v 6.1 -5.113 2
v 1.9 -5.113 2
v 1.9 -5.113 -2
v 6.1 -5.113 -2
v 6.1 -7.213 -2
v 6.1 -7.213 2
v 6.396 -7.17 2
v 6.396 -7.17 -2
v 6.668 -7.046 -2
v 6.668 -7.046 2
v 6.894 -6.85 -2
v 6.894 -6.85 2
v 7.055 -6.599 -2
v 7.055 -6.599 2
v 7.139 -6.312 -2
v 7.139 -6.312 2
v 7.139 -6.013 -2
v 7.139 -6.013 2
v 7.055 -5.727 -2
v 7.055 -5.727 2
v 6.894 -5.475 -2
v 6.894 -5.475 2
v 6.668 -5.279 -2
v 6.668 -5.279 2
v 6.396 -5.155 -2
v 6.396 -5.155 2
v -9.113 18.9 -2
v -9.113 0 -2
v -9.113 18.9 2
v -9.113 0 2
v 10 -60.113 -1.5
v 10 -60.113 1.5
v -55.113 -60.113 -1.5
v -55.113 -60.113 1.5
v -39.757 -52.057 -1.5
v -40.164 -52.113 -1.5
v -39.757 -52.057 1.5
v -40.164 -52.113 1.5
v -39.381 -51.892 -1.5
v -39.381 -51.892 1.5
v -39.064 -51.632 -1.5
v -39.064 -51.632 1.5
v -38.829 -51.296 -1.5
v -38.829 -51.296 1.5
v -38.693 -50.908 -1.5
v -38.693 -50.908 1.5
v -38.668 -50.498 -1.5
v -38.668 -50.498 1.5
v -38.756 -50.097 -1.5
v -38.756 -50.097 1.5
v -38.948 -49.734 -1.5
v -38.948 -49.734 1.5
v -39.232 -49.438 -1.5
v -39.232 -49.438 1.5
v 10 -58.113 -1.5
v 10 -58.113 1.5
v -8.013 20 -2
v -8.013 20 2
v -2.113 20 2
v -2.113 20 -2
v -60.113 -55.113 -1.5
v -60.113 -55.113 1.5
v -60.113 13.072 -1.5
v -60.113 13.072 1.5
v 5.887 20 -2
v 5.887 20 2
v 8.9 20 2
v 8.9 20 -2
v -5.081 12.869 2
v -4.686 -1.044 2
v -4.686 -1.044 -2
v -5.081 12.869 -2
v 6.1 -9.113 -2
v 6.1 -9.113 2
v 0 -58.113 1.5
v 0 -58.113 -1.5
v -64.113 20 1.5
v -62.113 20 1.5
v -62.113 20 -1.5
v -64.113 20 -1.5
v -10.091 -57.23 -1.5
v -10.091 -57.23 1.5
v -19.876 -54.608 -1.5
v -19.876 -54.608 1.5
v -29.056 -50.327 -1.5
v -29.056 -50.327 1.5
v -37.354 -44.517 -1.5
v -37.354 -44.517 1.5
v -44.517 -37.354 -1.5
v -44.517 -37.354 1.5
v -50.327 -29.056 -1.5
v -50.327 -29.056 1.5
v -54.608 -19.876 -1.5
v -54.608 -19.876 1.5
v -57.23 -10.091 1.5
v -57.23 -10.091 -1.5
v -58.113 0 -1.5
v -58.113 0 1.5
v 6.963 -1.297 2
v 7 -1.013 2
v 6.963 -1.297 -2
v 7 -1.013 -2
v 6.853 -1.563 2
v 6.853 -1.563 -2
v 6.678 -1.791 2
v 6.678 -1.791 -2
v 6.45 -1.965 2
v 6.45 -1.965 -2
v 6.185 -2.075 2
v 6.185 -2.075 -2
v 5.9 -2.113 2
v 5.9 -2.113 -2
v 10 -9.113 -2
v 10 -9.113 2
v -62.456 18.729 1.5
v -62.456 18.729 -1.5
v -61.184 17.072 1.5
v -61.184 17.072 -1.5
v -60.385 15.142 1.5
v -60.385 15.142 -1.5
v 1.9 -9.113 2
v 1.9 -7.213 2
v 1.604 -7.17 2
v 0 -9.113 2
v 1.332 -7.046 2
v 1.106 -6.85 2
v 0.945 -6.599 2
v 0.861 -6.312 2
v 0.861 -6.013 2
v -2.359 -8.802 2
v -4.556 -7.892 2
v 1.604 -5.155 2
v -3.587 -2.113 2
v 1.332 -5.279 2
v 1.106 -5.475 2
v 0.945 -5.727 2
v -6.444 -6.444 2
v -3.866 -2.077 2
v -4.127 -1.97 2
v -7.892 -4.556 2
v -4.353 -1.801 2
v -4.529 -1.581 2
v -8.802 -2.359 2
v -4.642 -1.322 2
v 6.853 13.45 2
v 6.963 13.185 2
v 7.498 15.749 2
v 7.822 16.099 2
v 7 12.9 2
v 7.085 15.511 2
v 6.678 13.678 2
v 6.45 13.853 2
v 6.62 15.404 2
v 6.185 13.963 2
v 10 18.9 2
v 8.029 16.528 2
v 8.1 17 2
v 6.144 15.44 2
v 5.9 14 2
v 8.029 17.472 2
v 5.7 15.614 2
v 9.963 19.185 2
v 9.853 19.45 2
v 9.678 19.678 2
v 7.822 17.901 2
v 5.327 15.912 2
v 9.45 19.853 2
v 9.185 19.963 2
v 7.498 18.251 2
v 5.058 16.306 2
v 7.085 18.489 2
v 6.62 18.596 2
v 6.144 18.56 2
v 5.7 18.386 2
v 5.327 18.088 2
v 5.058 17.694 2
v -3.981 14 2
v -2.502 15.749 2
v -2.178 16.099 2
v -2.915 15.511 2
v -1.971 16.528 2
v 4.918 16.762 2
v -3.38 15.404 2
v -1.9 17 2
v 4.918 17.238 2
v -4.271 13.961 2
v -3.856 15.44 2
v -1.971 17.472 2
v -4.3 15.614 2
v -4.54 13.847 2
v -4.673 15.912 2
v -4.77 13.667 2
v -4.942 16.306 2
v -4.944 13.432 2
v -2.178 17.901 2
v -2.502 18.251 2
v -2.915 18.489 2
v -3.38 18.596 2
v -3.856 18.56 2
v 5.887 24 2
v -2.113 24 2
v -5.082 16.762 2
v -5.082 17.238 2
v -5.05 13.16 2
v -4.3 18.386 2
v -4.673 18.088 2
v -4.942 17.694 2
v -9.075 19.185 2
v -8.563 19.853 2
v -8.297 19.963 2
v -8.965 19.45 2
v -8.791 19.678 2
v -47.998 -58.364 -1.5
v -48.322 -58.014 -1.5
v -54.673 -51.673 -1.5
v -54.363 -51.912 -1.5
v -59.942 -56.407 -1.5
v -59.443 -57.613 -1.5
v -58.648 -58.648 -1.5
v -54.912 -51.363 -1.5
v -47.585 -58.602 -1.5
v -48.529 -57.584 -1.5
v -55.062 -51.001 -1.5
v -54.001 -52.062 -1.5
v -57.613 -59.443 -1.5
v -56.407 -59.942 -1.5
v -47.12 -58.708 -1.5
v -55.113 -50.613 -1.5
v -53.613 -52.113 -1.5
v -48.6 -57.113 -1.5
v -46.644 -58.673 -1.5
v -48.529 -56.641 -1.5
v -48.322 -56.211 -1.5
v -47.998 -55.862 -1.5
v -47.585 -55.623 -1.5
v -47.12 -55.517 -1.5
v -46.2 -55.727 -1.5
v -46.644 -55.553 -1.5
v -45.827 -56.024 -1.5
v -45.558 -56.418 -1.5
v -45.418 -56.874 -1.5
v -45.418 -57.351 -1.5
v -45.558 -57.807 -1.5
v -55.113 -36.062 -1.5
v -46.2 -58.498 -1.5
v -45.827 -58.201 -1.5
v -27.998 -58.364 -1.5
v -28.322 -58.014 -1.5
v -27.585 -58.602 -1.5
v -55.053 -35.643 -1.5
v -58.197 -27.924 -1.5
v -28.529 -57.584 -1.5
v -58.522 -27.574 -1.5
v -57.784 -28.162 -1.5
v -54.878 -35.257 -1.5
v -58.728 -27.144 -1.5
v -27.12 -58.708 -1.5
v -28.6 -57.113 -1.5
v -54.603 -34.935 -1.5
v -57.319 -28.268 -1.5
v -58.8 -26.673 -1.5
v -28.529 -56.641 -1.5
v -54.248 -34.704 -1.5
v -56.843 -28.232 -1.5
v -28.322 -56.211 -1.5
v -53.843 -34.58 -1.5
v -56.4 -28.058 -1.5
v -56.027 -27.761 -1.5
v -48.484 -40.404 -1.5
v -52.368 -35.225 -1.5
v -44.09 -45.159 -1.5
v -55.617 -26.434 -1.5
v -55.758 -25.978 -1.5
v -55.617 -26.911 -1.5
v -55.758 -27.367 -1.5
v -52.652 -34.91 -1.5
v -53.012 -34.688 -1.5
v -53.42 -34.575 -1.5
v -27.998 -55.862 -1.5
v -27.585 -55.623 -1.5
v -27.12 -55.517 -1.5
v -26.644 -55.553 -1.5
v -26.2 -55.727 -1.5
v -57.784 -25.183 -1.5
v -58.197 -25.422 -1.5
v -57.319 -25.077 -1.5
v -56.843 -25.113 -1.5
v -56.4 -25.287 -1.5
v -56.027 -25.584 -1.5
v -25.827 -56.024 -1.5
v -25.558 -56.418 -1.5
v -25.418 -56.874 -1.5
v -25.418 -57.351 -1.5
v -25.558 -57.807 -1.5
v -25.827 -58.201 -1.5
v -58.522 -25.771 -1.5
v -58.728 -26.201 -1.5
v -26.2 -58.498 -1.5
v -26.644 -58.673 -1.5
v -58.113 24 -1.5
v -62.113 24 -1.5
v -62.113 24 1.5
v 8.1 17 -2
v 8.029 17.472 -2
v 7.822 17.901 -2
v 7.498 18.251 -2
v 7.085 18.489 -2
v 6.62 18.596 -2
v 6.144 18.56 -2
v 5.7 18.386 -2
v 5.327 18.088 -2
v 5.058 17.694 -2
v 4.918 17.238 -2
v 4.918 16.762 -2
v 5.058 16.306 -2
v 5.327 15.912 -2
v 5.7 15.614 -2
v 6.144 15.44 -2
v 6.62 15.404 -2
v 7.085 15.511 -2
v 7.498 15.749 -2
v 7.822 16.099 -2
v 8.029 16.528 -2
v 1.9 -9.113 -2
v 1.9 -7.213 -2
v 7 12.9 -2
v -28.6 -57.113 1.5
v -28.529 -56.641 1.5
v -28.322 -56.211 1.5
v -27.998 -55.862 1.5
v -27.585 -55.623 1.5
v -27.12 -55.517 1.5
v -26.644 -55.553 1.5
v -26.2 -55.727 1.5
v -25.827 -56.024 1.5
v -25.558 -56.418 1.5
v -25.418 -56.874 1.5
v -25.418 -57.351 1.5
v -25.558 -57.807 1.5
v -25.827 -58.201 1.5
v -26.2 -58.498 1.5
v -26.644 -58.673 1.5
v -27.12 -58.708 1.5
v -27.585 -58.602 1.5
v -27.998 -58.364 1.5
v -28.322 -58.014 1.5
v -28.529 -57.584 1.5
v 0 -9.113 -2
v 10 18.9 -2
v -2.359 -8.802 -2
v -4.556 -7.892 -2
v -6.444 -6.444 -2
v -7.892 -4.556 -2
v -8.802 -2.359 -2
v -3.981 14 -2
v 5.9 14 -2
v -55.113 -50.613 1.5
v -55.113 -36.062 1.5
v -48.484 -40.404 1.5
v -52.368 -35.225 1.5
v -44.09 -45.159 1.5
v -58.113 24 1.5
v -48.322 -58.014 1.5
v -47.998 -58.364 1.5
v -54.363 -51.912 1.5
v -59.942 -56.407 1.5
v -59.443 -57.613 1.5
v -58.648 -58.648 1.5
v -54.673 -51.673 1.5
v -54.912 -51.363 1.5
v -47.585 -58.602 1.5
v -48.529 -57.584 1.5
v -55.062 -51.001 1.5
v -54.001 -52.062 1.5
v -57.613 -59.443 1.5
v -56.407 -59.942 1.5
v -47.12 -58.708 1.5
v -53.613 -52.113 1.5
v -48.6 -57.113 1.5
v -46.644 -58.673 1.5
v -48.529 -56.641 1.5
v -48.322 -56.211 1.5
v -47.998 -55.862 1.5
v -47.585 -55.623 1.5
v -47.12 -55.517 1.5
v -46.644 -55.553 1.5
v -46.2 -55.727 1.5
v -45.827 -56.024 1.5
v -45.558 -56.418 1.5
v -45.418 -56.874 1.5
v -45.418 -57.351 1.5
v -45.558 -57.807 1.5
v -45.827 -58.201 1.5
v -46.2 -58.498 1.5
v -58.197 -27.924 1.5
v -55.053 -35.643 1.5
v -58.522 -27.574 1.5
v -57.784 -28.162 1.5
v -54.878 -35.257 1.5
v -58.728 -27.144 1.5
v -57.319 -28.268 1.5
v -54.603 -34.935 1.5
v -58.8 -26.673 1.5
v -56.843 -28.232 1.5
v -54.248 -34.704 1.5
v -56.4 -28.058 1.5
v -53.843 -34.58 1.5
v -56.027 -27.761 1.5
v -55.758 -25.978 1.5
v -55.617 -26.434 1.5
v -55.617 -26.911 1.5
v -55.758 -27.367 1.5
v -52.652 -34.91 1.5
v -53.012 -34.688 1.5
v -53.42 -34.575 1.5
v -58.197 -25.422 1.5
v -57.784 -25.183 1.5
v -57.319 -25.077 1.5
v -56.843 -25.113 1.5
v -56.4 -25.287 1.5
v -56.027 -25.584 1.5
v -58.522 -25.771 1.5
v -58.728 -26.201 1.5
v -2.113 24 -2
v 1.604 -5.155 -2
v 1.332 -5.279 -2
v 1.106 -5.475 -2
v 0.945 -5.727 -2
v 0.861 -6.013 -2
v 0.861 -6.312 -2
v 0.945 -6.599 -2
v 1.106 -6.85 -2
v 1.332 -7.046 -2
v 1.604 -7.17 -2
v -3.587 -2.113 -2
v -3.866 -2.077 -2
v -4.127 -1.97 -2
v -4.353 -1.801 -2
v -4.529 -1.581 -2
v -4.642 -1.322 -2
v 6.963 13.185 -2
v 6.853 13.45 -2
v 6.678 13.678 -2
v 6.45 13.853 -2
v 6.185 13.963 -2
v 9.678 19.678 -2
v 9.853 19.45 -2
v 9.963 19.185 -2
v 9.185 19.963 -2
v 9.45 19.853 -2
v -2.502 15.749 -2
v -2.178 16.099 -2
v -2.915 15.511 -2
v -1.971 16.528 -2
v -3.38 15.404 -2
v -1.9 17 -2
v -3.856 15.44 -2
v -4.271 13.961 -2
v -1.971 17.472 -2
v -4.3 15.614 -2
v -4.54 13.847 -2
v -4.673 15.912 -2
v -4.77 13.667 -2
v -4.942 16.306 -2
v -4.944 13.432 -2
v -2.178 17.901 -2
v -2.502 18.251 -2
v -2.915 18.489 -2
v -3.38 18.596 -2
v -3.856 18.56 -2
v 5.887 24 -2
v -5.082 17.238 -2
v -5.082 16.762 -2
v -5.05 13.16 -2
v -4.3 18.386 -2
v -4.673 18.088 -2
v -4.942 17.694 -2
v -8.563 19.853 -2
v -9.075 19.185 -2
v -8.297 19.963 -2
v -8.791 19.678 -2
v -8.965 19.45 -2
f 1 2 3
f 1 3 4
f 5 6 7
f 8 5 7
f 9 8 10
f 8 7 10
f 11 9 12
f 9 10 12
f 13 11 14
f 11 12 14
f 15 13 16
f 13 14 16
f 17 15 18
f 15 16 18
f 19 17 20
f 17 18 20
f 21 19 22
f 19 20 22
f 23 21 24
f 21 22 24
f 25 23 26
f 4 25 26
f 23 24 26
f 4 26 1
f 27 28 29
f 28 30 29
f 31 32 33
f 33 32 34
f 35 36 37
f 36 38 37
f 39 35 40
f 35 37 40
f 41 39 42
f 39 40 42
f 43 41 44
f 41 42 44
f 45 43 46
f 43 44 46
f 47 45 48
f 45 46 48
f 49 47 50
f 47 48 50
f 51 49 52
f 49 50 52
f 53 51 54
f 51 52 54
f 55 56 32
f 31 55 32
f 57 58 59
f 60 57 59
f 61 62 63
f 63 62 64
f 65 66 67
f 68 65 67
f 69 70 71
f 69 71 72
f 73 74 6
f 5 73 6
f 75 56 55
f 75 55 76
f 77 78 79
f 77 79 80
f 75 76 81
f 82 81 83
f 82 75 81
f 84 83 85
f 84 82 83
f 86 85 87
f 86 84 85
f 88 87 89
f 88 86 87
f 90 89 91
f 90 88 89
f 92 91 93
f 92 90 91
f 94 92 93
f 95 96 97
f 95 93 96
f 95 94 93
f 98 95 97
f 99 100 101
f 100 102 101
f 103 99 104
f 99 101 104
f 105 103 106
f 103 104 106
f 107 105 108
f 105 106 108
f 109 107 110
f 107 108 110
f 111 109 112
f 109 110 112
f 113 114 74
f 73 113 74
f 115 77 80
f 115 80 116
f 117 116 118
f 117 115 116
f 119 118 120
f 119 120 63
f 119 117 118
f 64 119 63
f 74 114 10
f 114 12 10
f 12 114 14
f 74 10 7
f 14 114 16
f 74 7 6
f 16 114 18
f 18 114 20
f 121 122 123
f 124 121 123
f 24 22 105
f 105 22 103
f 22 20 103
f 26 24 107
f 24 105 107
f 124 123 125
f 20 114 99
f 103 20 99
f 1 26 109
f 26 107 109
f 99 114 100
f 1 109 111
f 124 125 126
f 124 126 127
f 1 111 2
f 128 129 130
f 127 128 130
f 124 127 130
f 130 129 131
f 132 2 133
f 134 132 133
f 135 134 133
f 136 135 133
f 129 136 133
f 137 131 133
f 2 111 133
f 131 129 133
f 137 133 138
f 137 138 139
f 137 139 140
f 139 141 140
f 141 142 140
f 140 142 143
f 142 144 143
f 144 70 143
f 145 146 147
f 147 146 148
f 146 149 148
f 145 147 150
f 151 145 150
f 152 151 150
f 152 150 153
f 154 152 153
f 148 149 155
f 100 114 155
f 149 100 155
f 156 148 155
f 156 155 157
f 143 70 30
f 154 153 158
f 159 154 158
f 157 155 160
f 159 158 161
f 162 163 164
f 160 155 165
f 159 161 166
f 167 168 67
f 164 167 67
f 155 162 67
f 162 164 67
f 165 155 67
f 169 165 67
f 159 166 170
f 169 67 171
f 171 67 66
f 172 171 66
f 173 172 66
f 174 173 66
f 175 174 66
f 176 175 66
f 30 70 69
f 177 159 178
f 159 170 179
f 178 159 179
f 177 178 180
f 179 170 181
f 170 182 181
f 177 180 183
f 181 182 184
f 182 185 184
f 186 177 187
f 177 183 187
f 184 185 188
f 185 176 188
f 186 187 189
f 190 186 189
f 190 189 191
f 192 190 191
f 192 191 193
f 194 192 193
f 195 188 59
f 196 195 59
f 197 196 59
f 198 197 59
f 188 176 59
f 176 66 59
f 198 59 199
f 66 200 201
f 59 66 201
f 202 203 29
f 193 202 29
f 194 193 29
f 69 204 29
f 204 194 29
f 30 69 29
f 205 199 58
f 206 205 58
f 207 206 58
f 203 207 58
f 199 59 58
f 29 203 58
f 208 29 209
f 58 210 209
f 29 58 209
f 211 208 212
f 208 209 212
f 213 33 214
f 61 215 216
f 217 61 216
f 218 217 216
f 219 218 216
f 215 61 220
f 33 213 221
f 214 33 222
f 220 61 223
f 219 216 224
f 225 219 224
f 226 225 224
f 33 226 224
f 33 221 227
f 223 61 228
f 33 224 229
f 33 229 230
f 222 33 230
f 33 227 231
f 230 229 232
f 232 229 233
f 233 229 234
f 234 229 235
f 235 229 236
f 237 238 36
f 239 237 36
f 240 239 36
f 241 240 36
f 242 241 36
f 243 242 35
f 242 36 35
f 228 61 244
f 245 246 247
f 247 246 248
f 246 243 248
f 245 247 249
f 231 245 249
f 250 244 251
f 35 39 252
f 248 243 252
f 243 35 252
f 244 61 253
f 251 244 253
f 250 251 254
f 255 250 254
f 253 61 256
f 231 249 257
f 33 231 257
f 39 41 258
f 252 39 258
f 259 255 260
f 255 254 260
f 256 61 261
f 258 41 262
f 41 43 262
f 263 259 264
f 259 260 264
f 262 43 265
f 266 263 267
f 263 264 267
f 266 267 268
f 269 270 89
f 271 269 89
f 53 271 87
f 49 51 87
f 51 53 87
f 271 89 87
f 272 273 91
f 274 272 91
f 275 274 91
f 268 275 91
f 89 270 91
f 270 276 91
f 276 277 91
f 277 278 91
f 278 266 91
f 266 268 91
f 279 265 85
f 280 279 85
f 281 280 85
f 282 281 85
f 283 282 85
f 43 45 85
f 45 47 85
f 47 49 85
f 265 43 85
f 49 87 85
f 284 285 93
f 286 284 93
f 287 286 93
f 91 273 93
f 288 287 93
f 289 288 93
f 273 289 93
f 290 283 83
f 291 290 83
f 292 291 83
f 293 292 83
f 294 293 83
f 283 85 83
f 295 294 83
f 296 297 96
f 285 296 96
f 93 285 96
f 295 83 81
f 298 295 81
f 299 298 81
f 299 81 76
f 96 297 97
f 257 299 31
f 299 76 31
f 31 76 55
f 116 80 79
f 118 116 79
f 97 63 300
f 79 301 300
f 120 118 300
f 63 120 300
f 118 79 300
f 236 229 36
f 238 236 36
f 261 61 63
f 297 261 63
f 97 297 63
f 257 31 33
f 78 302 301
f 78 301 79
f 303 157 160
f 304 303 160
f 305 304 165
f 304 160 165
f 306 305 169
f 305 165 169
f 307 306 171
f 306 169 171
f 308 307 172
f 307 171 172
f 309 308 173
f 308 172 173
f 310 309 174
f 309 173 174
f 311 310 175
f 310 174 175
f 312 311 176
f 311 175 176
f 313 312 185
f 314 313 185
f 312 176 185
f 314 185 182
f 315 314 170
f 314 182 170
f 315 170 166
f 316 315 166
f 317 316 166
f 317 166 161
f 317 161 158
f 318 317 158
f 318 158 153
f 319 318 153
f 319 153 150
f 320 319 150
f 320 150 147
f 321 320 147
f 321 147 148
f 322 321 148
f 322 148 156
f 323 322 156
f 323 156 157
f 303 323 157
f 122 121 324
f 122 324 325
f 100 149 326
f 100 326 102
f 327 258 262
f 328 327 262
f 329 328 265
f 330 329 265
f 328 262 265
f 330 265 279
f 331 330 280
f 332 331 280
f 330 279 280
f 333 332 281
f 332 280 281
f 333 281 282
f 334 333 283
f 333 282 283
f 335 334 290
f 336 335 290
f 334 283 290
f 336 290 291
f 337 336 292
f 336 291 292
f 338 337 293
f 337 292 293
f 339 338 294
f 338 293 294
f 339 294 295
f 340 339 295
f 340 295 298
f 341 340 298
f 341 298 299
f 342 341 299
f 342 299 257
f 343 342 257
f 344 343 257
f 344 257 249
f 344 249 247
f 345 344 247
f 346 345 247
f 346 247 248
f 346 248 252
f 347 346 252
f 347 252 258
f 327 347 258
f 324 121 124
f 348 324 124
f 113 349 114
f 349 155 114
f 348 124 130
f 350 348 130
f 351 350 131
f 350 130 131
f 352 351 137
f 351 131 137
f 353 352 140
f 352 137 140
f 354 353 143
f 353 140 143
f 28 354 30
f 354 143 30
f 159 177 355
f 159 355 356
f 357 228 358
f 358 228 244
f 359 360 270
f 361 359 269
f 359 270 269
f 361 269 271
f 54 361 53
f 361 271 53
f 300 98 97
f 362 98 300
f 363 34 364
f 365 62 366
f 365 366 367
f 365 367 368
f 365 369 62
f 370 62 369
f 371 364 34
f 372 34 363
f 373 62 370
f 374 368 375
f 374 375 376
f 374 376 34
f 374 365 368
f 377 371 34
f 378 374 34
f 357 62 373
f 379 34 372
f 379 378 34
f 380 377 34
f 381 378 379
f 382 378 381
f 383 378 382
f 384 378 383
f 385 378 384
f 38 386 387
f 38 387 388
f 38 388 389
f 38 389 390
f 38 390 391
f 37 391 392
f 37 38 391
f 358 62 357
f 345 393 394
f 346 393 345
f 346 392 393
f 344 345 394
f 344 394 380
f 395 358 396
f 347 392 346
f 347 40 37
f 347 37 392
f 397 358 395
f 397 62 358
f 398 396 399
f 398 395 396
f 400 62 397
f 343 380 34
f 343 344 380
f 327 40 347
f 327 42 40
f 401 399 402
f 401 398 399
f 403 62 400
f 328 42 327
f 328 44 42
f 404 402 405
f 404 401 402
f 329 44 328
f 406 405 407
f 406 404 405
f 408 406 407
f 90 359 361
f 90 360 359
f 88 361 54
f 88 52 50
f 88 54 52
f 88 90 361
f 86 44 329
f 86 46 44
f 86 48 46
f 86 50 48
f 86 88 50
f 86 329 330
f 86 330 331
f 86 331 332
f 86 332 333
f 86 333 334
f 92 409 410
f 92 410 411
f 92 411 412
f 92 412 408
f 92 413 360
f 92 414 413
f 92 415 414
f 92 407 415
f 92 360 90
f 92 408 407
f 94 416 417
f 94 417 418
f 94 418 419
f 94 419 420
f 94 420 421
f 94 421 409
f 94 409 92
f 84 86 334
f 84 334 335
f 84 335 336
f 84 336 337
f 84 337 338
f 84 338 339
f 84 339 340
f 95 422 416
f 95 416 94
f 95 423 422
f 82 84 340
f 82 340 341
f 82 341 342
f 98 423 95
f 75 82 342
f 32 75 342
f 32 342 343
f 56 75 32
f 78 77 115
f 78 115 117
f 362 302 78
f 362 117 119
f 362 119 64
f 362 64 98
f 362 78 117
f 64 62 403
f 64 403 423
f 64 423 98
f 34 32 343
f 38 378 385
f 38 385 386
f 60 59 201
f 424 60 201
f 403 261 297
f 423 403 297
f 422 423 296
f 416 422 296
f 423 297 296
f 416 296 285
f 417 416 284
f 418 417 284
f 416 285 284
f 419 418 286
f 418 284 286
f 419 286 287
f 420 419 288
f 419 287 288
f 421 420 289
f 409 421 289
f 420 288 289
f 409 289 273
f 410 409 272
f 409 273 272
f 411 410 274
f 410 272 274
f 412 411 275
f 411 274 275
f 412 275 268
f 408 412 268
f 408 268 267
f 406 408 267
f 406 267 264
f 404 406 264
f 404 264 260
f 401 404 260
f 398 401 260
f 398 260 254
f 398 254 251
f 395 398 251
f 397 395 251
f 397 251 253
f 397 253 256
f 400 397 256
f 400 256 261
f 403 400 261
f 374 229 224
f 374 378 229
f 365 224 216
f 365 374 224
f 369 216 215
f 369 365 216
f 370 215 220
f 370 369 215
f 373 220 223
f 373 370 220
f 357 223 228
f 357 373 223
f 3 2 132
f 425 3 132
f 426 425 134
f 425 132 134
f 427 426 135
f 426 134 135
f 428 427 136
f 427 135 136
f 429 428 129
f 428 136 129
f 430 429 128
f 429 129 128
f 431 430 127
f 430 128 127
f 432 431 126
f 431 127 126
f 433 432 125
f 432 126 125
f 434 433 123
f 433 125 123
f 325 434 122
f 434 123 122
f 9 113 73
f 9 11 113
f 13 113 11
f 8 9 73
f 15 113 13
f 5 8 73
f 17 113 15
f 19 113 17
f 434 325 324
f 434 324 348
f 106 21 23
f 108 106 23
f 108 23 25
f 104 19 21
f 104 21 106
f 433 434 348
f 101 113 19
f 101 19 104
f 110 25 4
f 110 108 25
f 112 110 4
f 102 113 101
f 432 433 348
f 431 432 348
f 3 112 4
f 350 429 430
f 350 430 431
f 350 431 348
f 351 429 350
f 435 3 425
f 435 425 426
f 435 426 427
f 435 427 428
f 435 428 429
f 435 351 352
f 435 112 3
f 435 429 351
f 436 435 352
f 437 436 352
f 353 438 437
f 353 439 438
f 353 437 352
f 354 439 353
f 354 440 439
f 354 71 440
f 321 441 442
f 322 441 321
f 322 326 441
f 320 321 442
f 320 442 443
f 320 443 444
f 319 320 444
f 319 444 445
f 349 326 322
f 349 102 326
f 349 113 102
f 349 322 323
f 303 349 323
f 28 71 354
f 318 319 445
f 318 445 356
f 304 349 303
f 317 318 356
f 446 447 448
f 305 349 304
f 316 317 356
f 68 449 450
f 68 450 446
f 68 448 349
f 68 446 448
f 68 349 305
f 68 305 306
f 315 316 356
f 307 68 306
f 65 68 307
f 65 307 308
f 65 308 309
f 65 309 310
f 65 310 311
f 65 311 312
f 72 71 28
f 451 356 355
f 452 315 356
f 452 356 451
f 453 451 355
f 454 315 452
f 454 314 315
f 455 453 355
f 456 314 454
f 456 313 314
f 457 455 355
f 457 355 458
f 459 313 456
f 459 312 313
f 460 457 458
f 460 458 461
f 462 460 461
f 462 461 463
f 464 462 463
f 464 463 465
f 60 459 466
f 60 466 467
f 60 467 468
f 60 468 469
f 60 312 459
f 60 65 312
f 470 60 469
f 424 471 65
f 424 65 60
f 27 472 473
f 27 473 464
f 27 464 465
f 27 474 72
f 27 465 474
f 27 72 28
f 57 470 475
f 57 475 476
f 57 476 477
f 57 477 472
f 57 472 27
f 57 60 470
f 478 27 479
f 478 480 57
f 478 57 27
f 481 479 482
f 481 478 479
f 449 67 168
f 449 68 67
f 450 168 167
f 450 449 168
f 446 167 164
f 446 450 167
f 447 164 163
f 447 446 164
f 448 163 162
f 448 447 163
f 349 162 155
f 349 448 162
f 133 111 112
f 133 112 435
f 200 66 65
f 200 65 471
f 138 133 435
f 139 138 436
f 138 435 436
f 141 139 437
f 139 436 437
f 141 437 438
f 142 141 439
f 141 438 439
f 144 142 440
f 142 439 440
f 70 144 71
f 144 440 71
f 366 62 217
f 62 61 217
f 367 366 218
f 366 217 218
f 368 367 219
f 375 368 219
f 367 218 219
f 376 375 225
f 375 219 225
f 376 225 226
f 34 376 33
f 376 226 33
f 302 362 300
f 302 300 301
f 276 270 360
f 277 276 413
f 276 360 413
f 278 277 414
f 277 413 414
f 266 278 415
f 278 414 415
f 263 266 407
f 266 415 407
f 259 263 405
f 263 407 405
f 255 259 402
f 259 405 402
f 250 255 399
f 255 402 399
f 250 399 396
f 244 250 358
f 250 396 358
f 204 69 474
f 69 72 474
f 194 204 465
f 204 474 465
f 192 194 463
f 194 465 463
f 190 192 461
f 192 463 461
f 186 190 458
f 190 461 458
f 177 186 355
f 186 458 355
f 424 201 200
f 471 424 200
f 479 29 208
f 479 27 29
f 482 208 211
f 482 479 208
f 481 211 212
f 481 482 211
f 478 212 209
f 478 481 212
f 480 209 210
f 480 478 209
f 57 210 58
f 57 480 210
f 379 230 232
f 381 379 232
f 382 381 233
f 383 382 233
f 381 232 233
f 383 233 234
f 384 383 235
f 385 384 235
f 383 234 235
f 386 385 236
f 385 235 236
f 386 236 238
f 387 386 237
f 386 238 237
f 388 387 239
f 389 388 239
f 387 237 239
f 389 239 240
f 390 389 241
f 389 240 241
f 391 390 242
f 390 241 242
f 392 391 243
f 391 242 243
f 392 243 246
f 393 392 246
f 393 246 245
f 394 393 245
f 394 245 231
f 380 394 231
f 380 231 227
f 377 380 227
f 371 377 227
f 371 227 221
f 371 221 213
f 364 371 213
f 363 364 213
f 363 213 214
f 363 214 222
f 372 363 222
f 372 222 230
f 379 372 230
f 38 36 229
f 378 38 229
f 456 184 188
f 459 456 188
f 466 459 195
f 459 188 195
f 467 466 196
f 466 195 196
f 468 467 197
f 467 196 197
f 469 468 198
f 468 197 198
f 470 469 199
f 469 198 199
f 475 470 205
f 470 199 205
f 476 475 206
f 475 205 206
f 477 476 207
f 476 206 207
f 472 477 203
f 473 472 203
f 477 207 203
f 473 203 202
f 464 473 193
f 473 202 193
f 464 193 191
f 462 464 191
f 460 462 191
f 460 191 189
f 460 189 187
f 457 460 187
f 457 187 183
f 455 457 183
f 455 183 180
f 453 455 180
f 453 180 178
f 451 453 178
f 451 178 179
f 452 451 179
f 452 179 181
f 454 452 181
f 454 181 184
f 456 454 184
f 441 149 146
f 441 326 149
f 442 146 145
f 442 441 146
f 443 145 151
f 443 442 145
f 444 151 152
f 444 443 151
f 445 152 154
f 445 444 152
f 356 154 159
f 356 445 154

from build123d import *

# Parameters (mm, degrees)
EXTRUDE_1_DEPTH     = 2
EXTRUDE_2_DEPTH     = 1.5
FILLET_1_R          = 5
CUT_EXTRUDE_1_DEPTH = 10
SKETCH_5_R          = 1.6
CUT_EXTRUDE_2_DEPTH = 10
SKETCH_6_W          = 4.2
SKETCH_6_H          = 4.1
CUT_EXTRUDE_3_DEPTH = 10
SKETCH_7_R          = 1.05
CUT_EXTRUDE_4_DEPTH = 10
SKETCH_8_R          = 1.6
CUT_EXTRUDE_5_DEPTH = 10
SKETCH_9_W          = 8
SKETCH_9_H          = 4
EXTRUDE_3_DEPTH     = 4
EXTRUDE_4_DEPTH     = 3
FILLET_2_R          = 1.1
CUT_EXTRUDE_6_DEPTH = 10
FILLET_3_R          = 1.1
SKETCH_14_R         = 1.6
CUT_EXTRUDE_7_DEPTH = 10
CUT_EXTRUDE_8_DEPTH = 10
FILLET_4_R          = 1.5


with BuildPart() as part:
    # 草图1 → 凸台-拉伸1 (new, symmetric)
    with BuildSketch(Plane.XY):
        with BuildLine():
            Line((-9.112698372, 0), (-9.112698372, 20))
            Line((-9.112698372, 20), (10, 20))
            Line((10, 20), (10, -9.112698372))
            Line((10, -9.112698372), (0, -9.112698372))
            ThreePointArc((0, -9.112698372), (-6.443650814, -6.443650814), (-9.112698372, 0))
        make_face()
    extrude(amount=EXTRUDE_1_DEPTH, both=True)

    # 草图6 → 切除-拉伸3 (cut)
    with BuildSketch(Plane.XY.offset(2)):
        with Locations((4, -7.162698372)):
            Rectangle(SKETCH_6_W, SKETCH_6_H)
    extrude(amount=-CUT_EXTRUDE_3_DEPTH, mode=Mode.SUBTRACT)

    # 草图7 → 切除-拉伸4 (cut)
    with BuildSketch(Plane.XY.offset(2)):
        with Locations((1.9, -6.162698372)):
            Circle(SKETCH_7_R)
        with Locations((6.1, -6.162698372)):
            Circle(SKETCH_7_R)
    extrude(amount=-CUT_EXTRUDE_4_DEPTH, mode=Mode.SUBTRACT)

    # 草图8 → 切除-拉伸5 (cut)
    with BuildSketch(Plane.XY.offset(2)):
        with Locations((6.5, 17)):
            Circle(SKETCH_8_R)
        with Locations((-3.5, 17)):
            Circle(SKETCH_8_R)
    extrude(amount=-CUT_EXTRUDE_5_DEPTH, mode=Mode.SUBTRACT)

    # 草图9 → 凸台-拉伸3 (add)
    with BuildSketch(Plane.XY.offset(2)):
        with Locations((1.887301628, 22)):
            Rectangle(SKETCH_9_W, SKETCH_9_H)
    extrude(amount=-EXTRUDE_3_DEPTH)

    # 圆角2
    fillet_2_edges = [part.edges().sort_by_distance(p)[0] for p in [
        (-9.112698372, 20, 0),
        (10, 20, 0),
    ]]
    fillet(fillet_2_edges, radius=FILLET_2_R)

    # 草图12 → 切除-拉伸6 (cut)
    with BuildSketch(Plane.XY.offset(2)):
        Polygon((-5.112698372, 14), (7, 14), (7, -2.112698372), (-4.655769564, -2.112698372), align=None)
    extrude(amount=-CUT_EXTRUDE_6_DEPTH, mode=Mode.SUBTRACT)

    # 圆角3
    fillet_3_edges = [part.edges().sort_by_distance(p)[0] for p in [
        (-4.655769564, -2.112698372, 0),
        (-5.112698372, 14, 0),
        (7, 14, 0),
        (7, -2.112698372, 0),
    ]]
    fillet(fillet_3_edges, radius=FILLET_3_R)


with BuildPart() as body_2:
    # 草图2 → 凸台-拉伸2 (new, symmetric)
    with BuildSketch(Plane.XY):
        with BuildLine():
            Line((0, -53.112698372), (10, -53.112698372))
            Line((10, -53.112698372), (10, -60.112698372))
            Line((10, -60.112698372), (-60.112698372, -60.112698372))
            Line((-60.112698372, -60.112698372), (-60.112698372, 20))
            Line((-60.112698372, 20), (-53.112698372, 20))
            Line((-53.112698372, 20), (-53.112698372, 0))
            ThreePointArc((-53.112698372, 0), (-37.556349186, -37.556349186), (0, -53.112698372))
        make_face()
    extrude(amount=EXTRUDE_2_DEPTH, both=True)

    # 圆角1
    fillet_1_edges = [body_2.edges().sort_by_distance(p)[0] for p in [
        (-60.112698372, -60.112698372, 0),
    ]]
    fillet(fillet_1_edges, radius=FILLET_1_R)

    # 草图4 → 切除-拉伸1 (cut)
    with BuildSketch(Plane.XY.offset(1.5)):
        with BuildLine():
            Line((-58.112698372, 20), (-53.112698372, 20))
            Line((-53.112698372, 20), (-53.112698372, 0))
            ThreePointArc((-53.112698372, 0), (-37.556349186, -37.556349186), (0, -53.112698372))
            Line((0, -53.112698372), (10, -53.112698372))
            Line((10, -53.112698372), (10, -58.112698372))
            Line((10, -58.112698372), (0, -58.112698372))
            ThreePointArc((0, -58.112698372), (-41.091883092, -41.091883092), (-58.112698372, 0))
            Line((-58.112698372, 0), (-58.112698372, 20))
        make_face()
    extrude(amount=-CUT_EXTRUDE_1_DEPTH, mode=Mode.SUBTRACT)

    # 草图5 → 切除-拉伸2 (cut)
    with BuildSketch(Plane(origin=(0, 0, -1.5), x_dir=(-1, 0, 0), z_dir=(0, 0, -1))):
        with Locations((57.199529996, -26.67257888)):
            Circle(SKETCH_5_R)
    extrude(amount=-CUT_EXTRUDE_2_DEPTH, mode=Mode.SUBTRACT)

    # 草图11 → 凸台-拉伸4 (add)
    with BuildSketch(Plane.XY.offset(1.5)):
        with BuildLine():
            Line((-58.112698372, 20), (-58.112698372, 24))
            Line((-58.112698372, 24), (-62.112698372, 24))
            Line((-62.112698372, 24), (-62.112698372, 20))
            Line((-62.112698372, 20), (-64.112698372, 20))
            ThreePointArc((-64.112698372, 20), (-61.184495142, 17.07179677), (-60.112698372, 13.07179677))
            Line((-60.112698372, 13.07179677), (-60.112698372, 18))
            Line((-60.112698372, 18), (-58.112698372, 18))
            Line((-58.112698372, 18), (-58.112698372, 20))
        make_face()
    extrude(amount=-EXTRUDE_4_DEPTH)

    # 草图14 → 切除-拉伸7 (cut)
    with BuildSketch(Plane(origin=(0, 0, -1.5), x_dir=(-1, 0, 0), z_dir=(0, 0, -1))):
        with Locations((47, -57.112698372)):
            Circle(SKETCH_14_R)
        with Locations((27, -57.112698372)):
            Circle(SKETCH_14_R)
    extrude(amount=-CUT_EXTRUDE_7_DEPTH, mode=Mode.SUBTRACT)

    # 草图15 → 切除-拉伸8 (cut)
    with BuildSketch(Plane(origin=(0, 0, -1.5), x_dir=(-1, 0, 0), z_dir=(0, 0, -1))):
        with BuildLine():
            Line((35.601676424, -52.112698372), (55.112698372, -52.112698372))
            Line((55.112698372, -52.112698372), (55.112698372, -30.753913149))
            ThreePointArc((55.112698372, -30.753913149), (46.597466403, -42.566287372), (35.601676424, -52.112698372))
        make_face()
    extrude(amount=-CUT_EXTRUDE_8_DEPTH, mode=Mode.SUBTRACT)

    # 圆角4
    fillet_4_edges = [body_2.edges().sort_by_distance(p)[0] for p in [
        (-35.601676424, -52.112698372, 0),
        (-55.112698372, -30.753913149, 0),
        (-55.112698372, -52.112698372, 0),
    ]]
    fillet(fillet_4_edges, radius=FILLET_4_R)


solid = Compound([part.part, body_2.part])
